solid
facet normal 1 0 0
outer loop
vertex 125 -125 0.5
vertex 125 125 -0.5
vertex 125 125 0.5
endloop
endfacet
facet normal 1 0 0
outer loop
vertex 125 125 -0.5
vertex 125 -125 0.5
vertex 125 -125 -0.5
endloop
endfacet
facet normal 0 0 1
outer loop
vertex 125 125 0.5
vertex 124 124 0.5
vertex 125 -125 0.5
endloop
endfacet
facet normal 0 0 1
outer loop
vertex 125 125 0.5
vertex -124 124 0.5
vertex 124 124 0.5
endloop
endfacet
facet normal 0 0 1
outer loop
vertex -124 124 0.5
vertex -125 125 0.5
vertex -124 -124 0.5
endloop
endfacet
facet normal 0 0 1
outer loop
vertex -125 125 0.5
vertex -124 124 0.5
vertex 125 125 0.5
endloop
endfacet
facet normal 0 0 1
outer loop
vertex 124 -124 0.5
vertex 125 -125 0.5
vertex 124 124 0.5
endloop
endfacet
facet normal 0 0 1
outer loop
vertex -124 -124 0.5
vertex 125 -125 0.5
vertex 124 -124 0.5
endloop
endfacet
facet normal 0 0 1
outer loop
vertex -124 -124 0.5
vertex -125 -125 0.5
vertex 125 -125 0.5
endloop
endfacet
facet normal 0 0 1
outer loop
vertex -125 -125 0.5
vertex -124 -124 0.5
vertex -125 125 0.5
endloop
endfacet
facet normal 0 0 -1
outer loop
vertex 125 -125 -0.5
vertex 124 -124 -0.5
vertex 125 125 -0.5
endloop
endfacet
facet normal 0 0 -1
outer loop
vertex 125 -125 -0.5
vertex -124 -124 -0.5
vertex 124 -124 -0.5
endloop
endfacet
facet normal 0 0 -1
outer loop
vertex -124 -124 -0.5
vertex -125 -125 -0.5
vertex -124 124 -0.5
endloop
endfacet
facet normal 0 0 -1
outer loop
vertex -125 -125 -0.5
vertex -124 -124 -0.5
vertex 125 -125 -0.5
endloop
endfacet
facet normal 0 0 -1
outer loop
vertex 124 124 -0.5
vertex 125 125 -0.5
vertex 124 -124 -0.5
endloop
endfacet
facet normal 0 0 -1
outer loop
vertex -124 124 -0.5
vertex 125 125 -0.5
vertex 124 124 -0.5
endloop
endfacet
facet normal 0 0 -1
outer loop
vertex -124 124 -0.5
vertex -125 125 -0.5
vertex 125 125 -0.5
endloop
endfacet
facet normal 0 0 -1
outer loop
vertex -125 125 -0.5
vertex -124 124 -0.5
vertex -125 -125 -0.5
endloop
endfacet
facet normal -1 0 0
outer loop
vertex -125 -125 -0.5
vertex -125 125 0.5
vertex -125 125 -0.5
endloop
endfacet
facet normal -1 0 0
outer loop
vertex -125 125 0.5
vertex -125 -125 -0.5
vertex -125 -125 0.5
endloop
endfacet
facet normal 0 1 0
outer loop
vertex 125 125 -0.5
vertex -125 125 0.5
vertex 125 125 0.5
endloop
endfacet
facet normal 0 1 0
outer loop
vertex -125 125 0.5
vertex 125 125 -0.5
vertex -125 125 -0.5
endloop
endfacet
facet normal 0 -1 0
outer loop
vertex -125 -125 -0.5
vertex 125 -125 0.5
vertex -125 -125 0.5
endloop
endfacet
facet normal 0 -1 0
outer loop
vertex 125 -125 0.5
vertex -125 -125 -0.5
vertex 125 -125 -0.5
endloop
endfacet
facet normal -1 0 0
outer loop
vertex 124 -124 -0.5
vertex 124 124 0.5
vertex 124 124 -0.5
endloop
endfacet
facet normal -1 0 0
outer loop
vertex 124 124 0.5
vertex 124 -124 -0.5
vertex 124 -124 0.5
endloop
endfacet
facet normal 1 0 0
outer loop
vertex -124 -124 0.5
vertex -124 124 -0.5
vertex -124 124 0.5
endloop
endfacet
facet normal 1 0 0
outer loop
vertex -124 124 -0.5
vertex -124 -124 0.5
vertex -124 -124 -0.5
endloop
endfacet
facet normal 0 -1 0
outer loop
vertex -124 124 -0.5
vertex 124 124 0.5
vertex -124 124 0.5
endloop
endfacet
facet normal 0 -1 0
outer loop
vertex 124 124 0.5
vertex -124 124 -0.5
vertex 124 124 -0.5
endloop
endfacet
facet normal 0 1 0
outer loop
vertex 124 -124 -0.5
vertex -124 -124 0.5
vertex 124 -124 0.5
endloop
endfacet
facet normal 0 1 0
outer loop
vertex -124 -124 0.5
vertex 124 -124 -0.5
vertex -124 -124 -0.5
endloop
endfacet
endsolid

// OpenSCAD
h = 1;
n = 2;
difference() {
    cube([250,250,h],center=true);
    cube([250-n,250-n,h*1.1],center=true);
}
